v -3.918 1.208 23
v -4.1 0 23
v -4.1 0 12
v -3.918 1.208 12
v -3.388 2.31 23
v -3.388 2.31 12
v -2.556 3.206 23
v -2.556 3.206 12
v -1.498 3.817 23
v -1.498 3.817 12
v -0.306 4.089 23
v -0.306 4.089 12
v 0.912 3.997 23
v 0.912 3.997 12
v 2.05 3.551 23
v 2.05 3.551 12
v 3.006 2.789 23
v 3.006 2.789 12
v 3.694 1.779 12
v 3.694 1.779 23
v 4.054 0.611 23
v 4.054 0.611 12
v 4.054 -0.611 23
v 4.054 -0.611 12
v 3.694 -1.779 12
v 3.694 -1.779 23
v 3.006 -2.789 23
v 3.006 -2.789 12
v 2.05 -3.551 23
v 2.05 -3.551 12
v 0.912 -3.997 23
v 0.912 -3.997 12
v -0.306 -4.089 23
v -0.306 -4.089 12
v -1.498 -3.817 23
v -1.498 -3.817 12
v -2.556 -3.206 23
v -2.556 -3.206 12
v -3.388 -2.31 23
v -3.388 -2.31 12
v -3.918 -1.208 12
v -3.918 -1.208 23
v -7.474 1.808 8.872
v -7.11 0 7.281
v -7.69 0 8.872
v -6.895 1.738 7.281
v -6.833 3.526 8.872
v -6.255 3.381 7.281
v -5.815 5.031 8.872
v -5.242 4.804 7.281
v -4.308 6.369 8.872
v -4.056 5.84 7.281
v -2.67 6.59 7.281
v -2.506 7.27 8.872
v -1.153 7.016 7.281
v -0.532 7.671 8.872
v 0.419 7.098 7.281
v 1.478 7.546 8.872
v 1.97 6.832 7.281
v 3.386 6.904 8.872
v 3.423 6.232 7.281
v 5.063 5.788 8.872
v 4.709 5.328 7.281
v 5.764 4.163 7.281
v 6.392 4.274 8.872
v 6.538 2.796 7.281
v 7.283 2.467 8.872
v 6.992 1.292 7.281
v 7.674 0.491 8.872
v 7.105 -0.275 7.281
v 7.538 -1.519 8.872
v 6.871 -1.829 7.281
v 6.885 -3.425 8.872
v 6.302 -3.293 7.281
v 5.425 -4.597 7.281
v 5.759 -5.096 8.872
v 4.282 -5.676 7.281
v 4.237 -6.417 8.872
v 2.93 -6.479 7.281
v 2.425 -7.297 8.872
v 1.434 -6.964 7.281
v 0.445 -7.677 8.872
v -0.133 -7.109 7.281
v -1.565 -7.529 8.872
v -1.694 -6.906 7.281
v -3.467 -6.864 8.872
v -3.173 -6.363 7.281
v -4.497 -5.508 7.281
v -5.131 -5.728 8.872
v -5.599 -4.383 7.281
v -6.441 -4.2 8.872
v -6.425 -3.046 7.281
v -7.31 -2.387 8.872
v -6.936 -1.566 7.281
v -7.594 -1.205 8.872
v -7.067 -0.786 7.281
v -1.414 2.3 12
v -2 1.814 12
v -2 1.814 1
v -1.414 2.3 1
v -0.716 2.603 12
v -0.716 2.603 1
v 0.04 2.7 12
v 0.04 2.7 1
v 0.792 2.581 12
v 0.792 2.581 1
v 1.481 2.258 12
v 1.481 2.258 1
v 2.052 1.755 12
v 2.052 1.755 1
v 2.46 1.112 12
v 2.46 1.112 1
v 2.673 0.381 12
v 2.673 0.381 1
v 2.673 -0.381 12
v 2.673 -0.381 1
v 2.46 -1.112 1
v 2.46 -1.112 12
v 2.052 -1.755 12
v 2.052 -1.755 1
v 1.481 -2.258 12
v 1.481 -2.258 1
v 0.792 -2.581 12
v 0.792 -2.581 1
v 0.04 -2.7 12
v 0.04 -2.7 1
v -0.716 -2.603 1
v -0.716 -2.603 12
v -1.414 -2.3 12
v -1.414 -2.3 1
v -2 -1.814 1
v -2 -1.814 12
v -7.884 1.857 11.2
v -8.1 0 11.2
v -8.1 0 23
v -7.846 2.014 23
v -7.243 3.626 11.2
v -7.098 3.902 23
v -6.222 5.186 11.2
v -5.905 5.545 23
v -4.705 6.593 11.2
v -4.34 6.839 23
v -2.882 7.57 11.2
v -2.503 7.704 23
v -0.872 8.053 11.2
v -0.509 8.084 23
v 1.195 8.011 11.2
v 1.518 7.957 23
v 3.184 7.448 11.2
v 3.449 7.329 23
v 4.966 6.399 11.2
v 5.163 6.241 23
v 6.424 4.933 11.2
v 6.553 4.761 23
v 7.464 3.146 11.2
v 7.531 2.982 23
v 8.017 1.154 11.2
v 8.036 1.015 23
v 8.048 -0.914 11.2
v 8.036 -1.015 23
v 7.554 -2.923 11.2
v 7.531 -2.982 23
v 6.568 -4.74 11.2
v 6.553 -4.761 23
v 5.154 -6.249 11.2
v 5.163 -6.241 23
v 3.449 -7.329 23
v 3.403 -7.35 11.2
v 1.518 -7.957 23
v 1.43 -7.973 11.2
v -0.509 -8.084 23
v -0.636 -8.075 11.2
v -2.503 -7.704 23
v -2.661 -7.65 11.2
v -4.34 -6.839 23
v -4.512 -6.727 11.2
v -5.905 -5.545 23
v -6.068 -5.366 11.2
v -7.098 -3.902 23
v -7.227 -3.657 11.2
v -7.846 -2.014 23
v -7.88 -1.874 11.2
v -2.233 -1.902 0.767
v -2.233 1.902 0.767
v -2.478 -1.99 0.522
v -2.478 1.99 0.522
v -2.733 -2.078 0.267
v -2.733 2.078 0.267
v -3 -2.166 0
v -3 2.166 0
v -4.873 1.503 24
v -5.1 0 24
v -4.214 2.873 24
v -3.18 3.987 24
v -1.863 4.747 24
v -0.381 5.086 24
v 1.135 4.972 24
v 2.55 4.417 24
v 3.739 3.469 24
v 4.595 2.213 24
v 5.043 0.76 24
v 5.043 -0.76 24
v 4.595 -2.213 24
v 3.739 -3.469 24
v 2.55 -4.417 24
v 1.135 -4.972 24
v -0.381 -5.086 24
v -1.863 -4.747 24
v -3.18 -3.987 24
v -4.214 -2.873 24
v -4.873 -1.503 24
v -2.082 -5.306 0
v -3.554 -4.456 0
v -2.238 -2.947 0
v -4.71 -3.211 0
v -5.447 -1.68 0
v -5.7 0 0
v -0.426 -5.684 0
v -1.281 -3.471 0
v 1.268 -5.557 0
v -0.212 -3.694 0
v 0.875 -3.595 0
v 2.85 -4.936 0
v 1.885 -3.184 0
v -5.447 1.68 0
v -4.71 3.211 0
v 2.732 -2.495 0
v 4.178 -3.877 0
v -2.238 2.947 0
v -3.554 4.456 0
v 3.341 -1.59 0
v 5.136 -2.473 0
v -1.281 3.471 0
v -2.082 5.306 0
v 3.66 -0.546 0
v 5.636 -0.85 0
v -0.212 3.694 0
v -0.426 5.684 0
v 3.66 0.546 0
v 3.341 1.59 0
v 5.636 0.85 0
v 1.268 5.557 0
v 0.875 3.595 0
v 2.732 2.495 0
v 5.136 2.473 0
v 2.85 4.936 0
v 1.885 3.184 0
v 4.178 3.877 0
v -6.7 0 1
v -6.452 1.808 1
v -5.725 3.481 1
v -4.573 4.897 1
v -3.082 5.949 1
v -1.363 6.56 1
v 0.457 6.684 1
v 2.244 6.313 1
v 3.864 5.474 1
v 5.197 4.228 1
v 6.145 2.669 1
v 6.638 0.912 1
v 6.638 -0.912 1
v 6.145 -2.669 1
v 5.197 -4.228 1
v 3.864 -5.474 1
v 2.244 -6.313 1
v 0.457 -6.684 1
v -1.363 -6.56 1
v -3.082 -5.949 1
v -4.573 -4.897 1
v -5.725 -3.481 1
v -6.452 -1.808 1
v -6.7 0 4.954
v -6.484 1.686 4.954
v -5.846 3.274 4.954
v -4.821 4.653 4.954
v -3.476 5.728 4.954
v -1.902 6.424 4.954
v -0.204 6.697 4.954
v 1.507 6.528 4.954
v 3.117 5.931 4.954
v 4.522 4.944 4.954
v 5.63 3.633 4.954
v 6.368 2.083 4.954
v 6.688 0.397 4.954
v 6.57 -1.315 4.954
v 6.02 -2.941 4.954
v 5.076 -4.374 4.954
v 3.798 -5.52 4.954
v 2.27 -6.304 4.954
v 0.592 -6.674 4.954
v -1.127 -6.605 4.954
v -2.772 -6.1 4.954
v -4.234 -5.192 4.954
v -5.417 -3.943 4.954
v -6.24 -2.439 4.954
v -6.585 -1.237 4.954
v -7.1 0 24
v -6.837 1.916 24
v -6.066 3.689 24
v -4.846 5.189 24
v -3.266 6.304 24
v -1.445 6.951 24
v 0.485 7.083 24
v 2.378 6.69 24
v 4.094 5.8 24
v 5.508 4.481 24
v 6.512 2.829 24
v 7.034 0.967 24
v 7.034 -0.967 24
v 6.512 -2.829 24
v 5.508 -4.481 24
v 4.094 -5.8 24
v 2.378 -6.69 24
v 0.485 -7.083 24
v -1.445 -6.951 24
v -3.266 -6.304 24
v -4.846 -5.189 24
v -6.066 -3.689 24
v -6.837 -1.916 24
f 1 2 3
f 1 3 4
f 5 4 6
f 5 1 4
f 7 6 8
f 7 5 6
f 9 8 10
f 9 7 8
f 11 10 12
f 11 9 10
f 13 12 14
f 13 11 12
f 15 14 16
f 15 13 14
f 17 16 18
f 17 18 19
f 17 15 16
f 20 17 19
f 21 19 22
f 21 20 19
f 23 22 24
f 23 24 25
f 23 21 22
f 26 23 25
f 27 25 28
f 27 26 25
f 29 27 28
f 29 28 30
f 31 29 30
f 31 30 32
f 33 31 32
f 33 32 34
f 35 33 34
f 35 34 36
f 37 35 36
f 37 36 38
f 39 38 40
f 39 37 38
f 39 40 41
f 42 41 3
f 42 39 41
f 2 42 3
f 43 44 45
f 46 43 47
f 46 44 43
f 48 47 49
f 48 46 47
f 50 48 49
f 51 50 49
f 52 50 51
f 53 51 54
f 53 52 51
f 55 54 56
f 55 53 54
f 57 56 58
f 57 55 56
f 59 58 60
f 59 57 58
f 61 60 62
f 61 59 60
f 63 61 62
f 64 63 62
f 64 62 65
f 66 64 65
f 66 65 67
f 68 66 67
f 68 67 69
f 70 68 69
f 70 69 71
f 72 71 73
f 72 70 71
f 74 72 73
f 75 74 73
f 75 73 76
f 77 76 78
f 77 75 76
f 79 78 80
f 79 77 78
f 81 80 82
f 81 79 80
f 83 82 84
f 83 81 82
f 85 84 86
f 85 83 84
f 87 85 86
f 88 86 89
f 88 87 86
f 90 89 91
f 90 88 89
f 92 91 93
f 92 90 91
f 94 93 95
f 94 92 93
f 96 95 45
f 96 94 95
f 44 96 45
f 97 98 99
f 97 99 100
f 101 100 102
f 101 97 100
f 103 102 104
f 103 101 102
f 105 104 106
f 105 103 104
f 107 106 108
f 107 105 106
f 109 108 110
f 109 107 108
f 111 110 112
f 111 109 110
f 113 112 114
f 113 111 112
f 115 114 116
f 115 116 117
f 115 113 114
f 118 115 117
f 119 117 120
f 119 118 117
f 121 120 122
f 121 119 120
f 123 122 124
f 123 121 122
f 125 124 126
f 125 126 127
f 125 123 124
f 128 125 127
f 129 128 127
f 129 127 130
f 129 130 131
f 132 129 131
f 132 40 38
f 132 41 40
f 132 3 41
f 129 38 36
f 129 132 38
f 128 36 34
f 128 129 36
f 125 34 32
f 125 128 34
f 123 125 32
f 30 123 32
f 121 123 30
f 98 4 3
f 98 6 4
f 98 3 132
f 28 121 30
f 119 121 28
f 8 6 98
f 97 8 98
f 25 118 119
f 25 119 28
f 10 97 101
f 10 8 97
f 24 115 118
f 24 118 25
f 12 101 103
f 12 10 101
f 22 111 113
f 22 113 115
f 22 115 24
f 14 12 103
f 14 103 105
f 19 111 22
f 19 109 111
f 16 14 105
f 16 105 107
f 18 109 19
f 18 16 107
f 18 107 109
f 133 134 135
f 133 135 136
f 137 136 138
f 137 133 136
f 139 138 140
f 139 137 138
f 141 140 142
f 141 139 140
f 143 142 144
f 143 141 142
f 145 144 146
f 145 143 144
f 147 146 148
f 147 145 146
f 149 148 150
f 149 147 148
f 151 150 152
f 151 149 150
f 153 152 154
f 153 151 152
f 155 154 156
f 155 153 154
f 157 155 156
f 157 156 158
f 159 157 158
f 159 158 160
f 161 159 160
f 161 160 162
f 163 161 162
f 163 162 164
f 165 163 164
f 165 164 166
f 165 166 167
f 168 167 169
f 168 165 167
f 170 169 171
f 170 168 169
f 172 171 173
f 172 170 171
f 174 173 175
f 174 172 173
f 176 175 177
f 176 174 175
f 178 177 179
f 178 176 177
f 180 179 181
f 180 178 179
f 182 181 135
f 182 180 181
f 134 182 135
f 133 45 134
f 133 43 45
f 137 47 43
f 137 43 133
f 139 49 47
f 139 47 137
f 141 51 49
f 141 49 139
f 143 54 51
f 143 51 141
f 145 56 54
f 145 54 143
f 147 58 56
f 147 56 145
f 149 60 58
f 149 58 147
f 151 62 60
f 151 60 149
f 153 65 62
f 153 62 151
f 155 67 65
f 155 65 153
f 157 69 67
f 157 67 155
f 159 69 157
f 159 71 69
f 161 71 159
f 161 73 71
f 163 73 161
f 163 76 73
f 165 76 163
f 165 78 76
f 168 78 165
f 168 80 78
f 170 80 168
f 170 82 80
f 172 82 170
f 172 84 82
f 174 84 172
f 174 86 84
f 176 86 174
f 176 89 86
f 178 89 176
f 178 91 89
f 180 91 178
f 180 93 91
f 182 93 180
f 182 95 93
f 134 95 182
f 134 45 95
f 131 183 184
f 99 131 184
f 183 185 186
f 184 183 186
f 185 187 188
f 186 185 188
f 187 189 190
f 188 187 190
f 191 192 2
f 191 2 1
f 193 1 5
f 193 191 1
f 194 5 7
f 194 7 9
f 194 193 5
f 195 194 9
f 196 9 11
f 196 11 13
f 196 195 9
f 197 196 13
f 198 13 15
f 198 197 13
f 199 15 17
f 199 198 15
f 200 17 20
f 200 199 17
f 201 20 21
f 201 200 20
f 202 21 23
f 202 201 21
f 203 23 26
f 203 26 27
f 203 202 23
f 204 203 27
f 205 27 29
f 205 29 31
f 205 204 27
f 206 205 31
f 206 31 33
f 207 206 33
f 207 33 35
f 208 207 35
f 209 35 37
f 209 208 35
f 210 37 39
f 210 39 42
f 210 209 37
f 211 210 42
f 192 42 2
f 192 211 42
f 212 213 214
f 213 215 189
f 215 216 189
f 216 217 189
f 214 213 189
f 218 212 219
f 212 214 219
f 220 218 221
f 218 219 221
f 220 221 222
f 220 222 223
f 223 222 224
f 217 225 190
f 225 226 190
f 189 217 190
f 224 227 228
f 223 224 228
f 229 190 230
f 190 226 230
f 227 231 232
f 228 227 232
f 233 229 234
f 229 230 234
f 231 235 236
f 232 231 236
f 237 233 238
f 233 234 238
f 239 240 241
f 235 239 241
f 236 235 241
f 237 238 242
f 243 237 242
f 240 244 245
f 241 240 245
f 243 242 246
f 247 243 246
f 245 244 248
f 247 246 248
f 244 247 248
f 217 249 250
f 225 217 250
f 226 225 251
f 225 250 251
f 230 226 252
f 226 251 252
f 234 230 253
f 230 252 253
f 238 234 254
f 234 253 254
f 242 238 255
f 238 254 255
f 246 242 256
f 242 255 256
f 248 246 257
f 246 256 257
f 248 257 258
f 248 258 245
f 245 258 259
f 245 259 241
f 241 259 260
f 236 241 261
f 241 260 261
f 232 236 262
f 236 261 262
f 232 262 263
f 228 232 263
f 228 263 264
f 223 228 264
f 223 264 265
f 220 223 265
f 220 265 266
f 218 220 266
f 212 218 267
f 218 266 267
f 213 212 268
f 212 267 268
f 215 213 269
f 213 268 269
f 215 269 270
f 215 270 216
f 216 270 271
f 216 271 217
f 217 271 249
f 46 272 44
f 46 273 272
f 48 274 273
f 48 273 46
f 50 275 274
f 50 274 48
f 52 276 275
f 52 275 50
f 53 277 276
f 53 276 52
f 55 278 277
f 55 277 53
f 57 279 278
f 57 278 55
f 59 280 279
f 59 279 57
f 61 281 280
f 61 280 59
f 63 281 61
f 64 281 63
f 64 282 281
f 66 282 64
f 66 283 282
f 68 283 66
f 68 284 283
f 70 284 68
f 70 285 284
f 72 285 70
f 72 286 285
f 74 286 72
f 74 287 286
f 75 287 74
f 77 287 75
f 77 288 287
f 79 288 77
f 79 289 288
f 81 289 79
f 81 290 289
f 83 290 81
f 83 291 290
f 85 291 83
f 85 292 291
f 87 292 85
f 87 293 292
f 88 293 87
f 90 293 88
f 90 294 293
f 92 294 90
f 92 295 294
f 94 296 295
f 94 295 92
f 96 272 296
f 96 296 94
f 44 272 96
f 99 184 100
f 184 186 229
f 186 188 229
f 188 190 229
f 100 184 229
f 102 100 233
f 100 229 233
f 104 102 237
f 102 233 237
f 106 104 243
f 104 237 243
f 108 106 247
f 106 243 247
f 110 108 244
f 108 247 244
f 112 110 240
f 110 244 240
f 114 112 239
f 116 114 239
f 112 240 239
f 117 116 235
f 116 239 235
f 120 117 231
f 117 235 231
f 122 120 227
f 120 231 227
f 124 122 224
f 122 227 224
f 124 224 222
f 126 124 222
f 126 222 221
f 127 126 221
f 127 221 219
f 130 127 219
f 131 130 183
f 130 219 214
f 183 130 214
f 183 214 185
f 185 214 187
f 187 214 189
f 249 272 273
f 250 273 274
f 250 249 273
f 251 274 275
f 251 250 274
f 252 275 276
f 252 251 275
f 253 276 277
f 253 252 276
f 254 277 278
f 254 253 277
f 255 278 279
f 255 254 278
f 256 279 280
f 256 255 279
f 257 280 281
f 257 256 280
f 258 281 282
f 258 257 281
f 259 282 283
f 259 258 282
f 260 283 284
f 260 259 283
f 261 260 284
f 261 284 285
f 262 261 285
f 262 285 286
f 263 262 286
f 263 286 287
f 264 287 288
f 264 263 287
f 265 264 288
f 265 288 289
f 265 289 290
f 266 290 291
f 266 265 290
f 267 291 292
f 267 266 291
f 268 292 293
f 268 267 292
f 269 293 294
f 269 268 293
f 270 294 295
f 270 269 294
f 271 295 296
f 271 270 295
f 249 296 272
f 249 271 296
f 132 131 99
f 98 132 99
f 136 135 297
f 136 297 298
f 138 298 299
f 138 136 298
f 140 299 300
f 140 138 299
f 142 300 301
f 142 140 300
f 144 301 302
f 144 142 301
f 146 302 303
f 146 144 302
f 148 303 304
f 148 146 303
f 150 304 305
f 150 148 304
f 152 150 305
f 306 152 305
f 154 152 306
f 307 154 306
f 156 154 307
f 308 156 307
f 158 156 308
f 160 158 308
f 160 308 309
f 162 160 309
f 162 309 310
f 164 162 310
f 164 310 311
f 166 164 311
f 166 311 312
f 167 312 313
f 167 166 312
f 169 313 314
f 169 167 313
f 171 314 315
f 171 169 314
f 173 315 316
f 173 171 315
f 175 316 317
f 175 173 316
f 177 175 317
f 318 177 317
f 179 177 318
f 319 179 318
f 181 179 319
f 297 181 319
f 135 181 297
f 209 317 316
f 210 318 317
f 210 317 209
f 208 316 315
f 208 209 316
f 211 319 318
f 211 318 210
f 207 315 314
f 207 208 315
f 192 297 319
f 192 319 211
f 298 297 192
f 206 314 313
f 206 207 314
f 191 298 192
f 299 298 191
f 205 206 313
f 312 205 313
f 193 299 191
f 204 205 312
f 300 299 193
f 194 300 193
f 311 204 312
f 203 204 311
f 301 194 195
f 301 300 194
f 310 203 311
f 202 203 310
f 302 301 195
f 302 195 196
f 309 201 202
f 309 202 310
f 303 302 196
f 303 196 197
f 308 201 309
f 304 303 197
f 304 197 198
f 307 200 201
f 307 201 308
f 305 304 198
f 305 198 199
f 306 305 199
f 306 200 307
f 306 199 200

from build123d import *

# Parameters (mm, degrees)
F3_DEPTH = 12
F4_SIZE  = 1
F5_SIZE  = 1.2


with BuildPart() as f1:
    # F0 (on Front) → F1 (revolve)
    with BuildSketch(Plane.XZ):
        Polygon((-6.7, 0), (-2.7, 0), (-2.7, 12), (-4.1, 12), (-4.1, 24), (-8.1, 24), (-8.1, 10), (-6.7, 6.153532), align=None)
    revolve(axis=Axis((0, 0, 10.296541), (0, 0, -1)))

    # F2 (on Top) → F3 (join)
    with BuildSketch(Plane.XY):
        with BuildLine():
            Line((-2, -1.813836), (-2, 1.813836))
            ThreePointArc((-2, 1.813836), (-2.7, 0), (-2, -1.813836))
        make_face()
    extrude(amount=F3_DEPTH)

    # F4
    f4_edges = [f1.edges().sort_by_distance(p)[0] for p in [
        (8.1, 0, 24),
        (6.7, 0, 0),
        (2.7, 0, 0),
        (-2, 0, 0),
        (4.1, 0, 24),
    ]]
    chamfer(f4_edges, length=F4_SIZE)

    # F5
    f5_edges = [f1.edges().sort_by_distance(p)[0] for p in [
        (8.1, 0, 10),
        (6.7, 0, 6.153532),
    ]]
    chamfer(f5_edges, length=F5_SIZE)


solid = f1.part
